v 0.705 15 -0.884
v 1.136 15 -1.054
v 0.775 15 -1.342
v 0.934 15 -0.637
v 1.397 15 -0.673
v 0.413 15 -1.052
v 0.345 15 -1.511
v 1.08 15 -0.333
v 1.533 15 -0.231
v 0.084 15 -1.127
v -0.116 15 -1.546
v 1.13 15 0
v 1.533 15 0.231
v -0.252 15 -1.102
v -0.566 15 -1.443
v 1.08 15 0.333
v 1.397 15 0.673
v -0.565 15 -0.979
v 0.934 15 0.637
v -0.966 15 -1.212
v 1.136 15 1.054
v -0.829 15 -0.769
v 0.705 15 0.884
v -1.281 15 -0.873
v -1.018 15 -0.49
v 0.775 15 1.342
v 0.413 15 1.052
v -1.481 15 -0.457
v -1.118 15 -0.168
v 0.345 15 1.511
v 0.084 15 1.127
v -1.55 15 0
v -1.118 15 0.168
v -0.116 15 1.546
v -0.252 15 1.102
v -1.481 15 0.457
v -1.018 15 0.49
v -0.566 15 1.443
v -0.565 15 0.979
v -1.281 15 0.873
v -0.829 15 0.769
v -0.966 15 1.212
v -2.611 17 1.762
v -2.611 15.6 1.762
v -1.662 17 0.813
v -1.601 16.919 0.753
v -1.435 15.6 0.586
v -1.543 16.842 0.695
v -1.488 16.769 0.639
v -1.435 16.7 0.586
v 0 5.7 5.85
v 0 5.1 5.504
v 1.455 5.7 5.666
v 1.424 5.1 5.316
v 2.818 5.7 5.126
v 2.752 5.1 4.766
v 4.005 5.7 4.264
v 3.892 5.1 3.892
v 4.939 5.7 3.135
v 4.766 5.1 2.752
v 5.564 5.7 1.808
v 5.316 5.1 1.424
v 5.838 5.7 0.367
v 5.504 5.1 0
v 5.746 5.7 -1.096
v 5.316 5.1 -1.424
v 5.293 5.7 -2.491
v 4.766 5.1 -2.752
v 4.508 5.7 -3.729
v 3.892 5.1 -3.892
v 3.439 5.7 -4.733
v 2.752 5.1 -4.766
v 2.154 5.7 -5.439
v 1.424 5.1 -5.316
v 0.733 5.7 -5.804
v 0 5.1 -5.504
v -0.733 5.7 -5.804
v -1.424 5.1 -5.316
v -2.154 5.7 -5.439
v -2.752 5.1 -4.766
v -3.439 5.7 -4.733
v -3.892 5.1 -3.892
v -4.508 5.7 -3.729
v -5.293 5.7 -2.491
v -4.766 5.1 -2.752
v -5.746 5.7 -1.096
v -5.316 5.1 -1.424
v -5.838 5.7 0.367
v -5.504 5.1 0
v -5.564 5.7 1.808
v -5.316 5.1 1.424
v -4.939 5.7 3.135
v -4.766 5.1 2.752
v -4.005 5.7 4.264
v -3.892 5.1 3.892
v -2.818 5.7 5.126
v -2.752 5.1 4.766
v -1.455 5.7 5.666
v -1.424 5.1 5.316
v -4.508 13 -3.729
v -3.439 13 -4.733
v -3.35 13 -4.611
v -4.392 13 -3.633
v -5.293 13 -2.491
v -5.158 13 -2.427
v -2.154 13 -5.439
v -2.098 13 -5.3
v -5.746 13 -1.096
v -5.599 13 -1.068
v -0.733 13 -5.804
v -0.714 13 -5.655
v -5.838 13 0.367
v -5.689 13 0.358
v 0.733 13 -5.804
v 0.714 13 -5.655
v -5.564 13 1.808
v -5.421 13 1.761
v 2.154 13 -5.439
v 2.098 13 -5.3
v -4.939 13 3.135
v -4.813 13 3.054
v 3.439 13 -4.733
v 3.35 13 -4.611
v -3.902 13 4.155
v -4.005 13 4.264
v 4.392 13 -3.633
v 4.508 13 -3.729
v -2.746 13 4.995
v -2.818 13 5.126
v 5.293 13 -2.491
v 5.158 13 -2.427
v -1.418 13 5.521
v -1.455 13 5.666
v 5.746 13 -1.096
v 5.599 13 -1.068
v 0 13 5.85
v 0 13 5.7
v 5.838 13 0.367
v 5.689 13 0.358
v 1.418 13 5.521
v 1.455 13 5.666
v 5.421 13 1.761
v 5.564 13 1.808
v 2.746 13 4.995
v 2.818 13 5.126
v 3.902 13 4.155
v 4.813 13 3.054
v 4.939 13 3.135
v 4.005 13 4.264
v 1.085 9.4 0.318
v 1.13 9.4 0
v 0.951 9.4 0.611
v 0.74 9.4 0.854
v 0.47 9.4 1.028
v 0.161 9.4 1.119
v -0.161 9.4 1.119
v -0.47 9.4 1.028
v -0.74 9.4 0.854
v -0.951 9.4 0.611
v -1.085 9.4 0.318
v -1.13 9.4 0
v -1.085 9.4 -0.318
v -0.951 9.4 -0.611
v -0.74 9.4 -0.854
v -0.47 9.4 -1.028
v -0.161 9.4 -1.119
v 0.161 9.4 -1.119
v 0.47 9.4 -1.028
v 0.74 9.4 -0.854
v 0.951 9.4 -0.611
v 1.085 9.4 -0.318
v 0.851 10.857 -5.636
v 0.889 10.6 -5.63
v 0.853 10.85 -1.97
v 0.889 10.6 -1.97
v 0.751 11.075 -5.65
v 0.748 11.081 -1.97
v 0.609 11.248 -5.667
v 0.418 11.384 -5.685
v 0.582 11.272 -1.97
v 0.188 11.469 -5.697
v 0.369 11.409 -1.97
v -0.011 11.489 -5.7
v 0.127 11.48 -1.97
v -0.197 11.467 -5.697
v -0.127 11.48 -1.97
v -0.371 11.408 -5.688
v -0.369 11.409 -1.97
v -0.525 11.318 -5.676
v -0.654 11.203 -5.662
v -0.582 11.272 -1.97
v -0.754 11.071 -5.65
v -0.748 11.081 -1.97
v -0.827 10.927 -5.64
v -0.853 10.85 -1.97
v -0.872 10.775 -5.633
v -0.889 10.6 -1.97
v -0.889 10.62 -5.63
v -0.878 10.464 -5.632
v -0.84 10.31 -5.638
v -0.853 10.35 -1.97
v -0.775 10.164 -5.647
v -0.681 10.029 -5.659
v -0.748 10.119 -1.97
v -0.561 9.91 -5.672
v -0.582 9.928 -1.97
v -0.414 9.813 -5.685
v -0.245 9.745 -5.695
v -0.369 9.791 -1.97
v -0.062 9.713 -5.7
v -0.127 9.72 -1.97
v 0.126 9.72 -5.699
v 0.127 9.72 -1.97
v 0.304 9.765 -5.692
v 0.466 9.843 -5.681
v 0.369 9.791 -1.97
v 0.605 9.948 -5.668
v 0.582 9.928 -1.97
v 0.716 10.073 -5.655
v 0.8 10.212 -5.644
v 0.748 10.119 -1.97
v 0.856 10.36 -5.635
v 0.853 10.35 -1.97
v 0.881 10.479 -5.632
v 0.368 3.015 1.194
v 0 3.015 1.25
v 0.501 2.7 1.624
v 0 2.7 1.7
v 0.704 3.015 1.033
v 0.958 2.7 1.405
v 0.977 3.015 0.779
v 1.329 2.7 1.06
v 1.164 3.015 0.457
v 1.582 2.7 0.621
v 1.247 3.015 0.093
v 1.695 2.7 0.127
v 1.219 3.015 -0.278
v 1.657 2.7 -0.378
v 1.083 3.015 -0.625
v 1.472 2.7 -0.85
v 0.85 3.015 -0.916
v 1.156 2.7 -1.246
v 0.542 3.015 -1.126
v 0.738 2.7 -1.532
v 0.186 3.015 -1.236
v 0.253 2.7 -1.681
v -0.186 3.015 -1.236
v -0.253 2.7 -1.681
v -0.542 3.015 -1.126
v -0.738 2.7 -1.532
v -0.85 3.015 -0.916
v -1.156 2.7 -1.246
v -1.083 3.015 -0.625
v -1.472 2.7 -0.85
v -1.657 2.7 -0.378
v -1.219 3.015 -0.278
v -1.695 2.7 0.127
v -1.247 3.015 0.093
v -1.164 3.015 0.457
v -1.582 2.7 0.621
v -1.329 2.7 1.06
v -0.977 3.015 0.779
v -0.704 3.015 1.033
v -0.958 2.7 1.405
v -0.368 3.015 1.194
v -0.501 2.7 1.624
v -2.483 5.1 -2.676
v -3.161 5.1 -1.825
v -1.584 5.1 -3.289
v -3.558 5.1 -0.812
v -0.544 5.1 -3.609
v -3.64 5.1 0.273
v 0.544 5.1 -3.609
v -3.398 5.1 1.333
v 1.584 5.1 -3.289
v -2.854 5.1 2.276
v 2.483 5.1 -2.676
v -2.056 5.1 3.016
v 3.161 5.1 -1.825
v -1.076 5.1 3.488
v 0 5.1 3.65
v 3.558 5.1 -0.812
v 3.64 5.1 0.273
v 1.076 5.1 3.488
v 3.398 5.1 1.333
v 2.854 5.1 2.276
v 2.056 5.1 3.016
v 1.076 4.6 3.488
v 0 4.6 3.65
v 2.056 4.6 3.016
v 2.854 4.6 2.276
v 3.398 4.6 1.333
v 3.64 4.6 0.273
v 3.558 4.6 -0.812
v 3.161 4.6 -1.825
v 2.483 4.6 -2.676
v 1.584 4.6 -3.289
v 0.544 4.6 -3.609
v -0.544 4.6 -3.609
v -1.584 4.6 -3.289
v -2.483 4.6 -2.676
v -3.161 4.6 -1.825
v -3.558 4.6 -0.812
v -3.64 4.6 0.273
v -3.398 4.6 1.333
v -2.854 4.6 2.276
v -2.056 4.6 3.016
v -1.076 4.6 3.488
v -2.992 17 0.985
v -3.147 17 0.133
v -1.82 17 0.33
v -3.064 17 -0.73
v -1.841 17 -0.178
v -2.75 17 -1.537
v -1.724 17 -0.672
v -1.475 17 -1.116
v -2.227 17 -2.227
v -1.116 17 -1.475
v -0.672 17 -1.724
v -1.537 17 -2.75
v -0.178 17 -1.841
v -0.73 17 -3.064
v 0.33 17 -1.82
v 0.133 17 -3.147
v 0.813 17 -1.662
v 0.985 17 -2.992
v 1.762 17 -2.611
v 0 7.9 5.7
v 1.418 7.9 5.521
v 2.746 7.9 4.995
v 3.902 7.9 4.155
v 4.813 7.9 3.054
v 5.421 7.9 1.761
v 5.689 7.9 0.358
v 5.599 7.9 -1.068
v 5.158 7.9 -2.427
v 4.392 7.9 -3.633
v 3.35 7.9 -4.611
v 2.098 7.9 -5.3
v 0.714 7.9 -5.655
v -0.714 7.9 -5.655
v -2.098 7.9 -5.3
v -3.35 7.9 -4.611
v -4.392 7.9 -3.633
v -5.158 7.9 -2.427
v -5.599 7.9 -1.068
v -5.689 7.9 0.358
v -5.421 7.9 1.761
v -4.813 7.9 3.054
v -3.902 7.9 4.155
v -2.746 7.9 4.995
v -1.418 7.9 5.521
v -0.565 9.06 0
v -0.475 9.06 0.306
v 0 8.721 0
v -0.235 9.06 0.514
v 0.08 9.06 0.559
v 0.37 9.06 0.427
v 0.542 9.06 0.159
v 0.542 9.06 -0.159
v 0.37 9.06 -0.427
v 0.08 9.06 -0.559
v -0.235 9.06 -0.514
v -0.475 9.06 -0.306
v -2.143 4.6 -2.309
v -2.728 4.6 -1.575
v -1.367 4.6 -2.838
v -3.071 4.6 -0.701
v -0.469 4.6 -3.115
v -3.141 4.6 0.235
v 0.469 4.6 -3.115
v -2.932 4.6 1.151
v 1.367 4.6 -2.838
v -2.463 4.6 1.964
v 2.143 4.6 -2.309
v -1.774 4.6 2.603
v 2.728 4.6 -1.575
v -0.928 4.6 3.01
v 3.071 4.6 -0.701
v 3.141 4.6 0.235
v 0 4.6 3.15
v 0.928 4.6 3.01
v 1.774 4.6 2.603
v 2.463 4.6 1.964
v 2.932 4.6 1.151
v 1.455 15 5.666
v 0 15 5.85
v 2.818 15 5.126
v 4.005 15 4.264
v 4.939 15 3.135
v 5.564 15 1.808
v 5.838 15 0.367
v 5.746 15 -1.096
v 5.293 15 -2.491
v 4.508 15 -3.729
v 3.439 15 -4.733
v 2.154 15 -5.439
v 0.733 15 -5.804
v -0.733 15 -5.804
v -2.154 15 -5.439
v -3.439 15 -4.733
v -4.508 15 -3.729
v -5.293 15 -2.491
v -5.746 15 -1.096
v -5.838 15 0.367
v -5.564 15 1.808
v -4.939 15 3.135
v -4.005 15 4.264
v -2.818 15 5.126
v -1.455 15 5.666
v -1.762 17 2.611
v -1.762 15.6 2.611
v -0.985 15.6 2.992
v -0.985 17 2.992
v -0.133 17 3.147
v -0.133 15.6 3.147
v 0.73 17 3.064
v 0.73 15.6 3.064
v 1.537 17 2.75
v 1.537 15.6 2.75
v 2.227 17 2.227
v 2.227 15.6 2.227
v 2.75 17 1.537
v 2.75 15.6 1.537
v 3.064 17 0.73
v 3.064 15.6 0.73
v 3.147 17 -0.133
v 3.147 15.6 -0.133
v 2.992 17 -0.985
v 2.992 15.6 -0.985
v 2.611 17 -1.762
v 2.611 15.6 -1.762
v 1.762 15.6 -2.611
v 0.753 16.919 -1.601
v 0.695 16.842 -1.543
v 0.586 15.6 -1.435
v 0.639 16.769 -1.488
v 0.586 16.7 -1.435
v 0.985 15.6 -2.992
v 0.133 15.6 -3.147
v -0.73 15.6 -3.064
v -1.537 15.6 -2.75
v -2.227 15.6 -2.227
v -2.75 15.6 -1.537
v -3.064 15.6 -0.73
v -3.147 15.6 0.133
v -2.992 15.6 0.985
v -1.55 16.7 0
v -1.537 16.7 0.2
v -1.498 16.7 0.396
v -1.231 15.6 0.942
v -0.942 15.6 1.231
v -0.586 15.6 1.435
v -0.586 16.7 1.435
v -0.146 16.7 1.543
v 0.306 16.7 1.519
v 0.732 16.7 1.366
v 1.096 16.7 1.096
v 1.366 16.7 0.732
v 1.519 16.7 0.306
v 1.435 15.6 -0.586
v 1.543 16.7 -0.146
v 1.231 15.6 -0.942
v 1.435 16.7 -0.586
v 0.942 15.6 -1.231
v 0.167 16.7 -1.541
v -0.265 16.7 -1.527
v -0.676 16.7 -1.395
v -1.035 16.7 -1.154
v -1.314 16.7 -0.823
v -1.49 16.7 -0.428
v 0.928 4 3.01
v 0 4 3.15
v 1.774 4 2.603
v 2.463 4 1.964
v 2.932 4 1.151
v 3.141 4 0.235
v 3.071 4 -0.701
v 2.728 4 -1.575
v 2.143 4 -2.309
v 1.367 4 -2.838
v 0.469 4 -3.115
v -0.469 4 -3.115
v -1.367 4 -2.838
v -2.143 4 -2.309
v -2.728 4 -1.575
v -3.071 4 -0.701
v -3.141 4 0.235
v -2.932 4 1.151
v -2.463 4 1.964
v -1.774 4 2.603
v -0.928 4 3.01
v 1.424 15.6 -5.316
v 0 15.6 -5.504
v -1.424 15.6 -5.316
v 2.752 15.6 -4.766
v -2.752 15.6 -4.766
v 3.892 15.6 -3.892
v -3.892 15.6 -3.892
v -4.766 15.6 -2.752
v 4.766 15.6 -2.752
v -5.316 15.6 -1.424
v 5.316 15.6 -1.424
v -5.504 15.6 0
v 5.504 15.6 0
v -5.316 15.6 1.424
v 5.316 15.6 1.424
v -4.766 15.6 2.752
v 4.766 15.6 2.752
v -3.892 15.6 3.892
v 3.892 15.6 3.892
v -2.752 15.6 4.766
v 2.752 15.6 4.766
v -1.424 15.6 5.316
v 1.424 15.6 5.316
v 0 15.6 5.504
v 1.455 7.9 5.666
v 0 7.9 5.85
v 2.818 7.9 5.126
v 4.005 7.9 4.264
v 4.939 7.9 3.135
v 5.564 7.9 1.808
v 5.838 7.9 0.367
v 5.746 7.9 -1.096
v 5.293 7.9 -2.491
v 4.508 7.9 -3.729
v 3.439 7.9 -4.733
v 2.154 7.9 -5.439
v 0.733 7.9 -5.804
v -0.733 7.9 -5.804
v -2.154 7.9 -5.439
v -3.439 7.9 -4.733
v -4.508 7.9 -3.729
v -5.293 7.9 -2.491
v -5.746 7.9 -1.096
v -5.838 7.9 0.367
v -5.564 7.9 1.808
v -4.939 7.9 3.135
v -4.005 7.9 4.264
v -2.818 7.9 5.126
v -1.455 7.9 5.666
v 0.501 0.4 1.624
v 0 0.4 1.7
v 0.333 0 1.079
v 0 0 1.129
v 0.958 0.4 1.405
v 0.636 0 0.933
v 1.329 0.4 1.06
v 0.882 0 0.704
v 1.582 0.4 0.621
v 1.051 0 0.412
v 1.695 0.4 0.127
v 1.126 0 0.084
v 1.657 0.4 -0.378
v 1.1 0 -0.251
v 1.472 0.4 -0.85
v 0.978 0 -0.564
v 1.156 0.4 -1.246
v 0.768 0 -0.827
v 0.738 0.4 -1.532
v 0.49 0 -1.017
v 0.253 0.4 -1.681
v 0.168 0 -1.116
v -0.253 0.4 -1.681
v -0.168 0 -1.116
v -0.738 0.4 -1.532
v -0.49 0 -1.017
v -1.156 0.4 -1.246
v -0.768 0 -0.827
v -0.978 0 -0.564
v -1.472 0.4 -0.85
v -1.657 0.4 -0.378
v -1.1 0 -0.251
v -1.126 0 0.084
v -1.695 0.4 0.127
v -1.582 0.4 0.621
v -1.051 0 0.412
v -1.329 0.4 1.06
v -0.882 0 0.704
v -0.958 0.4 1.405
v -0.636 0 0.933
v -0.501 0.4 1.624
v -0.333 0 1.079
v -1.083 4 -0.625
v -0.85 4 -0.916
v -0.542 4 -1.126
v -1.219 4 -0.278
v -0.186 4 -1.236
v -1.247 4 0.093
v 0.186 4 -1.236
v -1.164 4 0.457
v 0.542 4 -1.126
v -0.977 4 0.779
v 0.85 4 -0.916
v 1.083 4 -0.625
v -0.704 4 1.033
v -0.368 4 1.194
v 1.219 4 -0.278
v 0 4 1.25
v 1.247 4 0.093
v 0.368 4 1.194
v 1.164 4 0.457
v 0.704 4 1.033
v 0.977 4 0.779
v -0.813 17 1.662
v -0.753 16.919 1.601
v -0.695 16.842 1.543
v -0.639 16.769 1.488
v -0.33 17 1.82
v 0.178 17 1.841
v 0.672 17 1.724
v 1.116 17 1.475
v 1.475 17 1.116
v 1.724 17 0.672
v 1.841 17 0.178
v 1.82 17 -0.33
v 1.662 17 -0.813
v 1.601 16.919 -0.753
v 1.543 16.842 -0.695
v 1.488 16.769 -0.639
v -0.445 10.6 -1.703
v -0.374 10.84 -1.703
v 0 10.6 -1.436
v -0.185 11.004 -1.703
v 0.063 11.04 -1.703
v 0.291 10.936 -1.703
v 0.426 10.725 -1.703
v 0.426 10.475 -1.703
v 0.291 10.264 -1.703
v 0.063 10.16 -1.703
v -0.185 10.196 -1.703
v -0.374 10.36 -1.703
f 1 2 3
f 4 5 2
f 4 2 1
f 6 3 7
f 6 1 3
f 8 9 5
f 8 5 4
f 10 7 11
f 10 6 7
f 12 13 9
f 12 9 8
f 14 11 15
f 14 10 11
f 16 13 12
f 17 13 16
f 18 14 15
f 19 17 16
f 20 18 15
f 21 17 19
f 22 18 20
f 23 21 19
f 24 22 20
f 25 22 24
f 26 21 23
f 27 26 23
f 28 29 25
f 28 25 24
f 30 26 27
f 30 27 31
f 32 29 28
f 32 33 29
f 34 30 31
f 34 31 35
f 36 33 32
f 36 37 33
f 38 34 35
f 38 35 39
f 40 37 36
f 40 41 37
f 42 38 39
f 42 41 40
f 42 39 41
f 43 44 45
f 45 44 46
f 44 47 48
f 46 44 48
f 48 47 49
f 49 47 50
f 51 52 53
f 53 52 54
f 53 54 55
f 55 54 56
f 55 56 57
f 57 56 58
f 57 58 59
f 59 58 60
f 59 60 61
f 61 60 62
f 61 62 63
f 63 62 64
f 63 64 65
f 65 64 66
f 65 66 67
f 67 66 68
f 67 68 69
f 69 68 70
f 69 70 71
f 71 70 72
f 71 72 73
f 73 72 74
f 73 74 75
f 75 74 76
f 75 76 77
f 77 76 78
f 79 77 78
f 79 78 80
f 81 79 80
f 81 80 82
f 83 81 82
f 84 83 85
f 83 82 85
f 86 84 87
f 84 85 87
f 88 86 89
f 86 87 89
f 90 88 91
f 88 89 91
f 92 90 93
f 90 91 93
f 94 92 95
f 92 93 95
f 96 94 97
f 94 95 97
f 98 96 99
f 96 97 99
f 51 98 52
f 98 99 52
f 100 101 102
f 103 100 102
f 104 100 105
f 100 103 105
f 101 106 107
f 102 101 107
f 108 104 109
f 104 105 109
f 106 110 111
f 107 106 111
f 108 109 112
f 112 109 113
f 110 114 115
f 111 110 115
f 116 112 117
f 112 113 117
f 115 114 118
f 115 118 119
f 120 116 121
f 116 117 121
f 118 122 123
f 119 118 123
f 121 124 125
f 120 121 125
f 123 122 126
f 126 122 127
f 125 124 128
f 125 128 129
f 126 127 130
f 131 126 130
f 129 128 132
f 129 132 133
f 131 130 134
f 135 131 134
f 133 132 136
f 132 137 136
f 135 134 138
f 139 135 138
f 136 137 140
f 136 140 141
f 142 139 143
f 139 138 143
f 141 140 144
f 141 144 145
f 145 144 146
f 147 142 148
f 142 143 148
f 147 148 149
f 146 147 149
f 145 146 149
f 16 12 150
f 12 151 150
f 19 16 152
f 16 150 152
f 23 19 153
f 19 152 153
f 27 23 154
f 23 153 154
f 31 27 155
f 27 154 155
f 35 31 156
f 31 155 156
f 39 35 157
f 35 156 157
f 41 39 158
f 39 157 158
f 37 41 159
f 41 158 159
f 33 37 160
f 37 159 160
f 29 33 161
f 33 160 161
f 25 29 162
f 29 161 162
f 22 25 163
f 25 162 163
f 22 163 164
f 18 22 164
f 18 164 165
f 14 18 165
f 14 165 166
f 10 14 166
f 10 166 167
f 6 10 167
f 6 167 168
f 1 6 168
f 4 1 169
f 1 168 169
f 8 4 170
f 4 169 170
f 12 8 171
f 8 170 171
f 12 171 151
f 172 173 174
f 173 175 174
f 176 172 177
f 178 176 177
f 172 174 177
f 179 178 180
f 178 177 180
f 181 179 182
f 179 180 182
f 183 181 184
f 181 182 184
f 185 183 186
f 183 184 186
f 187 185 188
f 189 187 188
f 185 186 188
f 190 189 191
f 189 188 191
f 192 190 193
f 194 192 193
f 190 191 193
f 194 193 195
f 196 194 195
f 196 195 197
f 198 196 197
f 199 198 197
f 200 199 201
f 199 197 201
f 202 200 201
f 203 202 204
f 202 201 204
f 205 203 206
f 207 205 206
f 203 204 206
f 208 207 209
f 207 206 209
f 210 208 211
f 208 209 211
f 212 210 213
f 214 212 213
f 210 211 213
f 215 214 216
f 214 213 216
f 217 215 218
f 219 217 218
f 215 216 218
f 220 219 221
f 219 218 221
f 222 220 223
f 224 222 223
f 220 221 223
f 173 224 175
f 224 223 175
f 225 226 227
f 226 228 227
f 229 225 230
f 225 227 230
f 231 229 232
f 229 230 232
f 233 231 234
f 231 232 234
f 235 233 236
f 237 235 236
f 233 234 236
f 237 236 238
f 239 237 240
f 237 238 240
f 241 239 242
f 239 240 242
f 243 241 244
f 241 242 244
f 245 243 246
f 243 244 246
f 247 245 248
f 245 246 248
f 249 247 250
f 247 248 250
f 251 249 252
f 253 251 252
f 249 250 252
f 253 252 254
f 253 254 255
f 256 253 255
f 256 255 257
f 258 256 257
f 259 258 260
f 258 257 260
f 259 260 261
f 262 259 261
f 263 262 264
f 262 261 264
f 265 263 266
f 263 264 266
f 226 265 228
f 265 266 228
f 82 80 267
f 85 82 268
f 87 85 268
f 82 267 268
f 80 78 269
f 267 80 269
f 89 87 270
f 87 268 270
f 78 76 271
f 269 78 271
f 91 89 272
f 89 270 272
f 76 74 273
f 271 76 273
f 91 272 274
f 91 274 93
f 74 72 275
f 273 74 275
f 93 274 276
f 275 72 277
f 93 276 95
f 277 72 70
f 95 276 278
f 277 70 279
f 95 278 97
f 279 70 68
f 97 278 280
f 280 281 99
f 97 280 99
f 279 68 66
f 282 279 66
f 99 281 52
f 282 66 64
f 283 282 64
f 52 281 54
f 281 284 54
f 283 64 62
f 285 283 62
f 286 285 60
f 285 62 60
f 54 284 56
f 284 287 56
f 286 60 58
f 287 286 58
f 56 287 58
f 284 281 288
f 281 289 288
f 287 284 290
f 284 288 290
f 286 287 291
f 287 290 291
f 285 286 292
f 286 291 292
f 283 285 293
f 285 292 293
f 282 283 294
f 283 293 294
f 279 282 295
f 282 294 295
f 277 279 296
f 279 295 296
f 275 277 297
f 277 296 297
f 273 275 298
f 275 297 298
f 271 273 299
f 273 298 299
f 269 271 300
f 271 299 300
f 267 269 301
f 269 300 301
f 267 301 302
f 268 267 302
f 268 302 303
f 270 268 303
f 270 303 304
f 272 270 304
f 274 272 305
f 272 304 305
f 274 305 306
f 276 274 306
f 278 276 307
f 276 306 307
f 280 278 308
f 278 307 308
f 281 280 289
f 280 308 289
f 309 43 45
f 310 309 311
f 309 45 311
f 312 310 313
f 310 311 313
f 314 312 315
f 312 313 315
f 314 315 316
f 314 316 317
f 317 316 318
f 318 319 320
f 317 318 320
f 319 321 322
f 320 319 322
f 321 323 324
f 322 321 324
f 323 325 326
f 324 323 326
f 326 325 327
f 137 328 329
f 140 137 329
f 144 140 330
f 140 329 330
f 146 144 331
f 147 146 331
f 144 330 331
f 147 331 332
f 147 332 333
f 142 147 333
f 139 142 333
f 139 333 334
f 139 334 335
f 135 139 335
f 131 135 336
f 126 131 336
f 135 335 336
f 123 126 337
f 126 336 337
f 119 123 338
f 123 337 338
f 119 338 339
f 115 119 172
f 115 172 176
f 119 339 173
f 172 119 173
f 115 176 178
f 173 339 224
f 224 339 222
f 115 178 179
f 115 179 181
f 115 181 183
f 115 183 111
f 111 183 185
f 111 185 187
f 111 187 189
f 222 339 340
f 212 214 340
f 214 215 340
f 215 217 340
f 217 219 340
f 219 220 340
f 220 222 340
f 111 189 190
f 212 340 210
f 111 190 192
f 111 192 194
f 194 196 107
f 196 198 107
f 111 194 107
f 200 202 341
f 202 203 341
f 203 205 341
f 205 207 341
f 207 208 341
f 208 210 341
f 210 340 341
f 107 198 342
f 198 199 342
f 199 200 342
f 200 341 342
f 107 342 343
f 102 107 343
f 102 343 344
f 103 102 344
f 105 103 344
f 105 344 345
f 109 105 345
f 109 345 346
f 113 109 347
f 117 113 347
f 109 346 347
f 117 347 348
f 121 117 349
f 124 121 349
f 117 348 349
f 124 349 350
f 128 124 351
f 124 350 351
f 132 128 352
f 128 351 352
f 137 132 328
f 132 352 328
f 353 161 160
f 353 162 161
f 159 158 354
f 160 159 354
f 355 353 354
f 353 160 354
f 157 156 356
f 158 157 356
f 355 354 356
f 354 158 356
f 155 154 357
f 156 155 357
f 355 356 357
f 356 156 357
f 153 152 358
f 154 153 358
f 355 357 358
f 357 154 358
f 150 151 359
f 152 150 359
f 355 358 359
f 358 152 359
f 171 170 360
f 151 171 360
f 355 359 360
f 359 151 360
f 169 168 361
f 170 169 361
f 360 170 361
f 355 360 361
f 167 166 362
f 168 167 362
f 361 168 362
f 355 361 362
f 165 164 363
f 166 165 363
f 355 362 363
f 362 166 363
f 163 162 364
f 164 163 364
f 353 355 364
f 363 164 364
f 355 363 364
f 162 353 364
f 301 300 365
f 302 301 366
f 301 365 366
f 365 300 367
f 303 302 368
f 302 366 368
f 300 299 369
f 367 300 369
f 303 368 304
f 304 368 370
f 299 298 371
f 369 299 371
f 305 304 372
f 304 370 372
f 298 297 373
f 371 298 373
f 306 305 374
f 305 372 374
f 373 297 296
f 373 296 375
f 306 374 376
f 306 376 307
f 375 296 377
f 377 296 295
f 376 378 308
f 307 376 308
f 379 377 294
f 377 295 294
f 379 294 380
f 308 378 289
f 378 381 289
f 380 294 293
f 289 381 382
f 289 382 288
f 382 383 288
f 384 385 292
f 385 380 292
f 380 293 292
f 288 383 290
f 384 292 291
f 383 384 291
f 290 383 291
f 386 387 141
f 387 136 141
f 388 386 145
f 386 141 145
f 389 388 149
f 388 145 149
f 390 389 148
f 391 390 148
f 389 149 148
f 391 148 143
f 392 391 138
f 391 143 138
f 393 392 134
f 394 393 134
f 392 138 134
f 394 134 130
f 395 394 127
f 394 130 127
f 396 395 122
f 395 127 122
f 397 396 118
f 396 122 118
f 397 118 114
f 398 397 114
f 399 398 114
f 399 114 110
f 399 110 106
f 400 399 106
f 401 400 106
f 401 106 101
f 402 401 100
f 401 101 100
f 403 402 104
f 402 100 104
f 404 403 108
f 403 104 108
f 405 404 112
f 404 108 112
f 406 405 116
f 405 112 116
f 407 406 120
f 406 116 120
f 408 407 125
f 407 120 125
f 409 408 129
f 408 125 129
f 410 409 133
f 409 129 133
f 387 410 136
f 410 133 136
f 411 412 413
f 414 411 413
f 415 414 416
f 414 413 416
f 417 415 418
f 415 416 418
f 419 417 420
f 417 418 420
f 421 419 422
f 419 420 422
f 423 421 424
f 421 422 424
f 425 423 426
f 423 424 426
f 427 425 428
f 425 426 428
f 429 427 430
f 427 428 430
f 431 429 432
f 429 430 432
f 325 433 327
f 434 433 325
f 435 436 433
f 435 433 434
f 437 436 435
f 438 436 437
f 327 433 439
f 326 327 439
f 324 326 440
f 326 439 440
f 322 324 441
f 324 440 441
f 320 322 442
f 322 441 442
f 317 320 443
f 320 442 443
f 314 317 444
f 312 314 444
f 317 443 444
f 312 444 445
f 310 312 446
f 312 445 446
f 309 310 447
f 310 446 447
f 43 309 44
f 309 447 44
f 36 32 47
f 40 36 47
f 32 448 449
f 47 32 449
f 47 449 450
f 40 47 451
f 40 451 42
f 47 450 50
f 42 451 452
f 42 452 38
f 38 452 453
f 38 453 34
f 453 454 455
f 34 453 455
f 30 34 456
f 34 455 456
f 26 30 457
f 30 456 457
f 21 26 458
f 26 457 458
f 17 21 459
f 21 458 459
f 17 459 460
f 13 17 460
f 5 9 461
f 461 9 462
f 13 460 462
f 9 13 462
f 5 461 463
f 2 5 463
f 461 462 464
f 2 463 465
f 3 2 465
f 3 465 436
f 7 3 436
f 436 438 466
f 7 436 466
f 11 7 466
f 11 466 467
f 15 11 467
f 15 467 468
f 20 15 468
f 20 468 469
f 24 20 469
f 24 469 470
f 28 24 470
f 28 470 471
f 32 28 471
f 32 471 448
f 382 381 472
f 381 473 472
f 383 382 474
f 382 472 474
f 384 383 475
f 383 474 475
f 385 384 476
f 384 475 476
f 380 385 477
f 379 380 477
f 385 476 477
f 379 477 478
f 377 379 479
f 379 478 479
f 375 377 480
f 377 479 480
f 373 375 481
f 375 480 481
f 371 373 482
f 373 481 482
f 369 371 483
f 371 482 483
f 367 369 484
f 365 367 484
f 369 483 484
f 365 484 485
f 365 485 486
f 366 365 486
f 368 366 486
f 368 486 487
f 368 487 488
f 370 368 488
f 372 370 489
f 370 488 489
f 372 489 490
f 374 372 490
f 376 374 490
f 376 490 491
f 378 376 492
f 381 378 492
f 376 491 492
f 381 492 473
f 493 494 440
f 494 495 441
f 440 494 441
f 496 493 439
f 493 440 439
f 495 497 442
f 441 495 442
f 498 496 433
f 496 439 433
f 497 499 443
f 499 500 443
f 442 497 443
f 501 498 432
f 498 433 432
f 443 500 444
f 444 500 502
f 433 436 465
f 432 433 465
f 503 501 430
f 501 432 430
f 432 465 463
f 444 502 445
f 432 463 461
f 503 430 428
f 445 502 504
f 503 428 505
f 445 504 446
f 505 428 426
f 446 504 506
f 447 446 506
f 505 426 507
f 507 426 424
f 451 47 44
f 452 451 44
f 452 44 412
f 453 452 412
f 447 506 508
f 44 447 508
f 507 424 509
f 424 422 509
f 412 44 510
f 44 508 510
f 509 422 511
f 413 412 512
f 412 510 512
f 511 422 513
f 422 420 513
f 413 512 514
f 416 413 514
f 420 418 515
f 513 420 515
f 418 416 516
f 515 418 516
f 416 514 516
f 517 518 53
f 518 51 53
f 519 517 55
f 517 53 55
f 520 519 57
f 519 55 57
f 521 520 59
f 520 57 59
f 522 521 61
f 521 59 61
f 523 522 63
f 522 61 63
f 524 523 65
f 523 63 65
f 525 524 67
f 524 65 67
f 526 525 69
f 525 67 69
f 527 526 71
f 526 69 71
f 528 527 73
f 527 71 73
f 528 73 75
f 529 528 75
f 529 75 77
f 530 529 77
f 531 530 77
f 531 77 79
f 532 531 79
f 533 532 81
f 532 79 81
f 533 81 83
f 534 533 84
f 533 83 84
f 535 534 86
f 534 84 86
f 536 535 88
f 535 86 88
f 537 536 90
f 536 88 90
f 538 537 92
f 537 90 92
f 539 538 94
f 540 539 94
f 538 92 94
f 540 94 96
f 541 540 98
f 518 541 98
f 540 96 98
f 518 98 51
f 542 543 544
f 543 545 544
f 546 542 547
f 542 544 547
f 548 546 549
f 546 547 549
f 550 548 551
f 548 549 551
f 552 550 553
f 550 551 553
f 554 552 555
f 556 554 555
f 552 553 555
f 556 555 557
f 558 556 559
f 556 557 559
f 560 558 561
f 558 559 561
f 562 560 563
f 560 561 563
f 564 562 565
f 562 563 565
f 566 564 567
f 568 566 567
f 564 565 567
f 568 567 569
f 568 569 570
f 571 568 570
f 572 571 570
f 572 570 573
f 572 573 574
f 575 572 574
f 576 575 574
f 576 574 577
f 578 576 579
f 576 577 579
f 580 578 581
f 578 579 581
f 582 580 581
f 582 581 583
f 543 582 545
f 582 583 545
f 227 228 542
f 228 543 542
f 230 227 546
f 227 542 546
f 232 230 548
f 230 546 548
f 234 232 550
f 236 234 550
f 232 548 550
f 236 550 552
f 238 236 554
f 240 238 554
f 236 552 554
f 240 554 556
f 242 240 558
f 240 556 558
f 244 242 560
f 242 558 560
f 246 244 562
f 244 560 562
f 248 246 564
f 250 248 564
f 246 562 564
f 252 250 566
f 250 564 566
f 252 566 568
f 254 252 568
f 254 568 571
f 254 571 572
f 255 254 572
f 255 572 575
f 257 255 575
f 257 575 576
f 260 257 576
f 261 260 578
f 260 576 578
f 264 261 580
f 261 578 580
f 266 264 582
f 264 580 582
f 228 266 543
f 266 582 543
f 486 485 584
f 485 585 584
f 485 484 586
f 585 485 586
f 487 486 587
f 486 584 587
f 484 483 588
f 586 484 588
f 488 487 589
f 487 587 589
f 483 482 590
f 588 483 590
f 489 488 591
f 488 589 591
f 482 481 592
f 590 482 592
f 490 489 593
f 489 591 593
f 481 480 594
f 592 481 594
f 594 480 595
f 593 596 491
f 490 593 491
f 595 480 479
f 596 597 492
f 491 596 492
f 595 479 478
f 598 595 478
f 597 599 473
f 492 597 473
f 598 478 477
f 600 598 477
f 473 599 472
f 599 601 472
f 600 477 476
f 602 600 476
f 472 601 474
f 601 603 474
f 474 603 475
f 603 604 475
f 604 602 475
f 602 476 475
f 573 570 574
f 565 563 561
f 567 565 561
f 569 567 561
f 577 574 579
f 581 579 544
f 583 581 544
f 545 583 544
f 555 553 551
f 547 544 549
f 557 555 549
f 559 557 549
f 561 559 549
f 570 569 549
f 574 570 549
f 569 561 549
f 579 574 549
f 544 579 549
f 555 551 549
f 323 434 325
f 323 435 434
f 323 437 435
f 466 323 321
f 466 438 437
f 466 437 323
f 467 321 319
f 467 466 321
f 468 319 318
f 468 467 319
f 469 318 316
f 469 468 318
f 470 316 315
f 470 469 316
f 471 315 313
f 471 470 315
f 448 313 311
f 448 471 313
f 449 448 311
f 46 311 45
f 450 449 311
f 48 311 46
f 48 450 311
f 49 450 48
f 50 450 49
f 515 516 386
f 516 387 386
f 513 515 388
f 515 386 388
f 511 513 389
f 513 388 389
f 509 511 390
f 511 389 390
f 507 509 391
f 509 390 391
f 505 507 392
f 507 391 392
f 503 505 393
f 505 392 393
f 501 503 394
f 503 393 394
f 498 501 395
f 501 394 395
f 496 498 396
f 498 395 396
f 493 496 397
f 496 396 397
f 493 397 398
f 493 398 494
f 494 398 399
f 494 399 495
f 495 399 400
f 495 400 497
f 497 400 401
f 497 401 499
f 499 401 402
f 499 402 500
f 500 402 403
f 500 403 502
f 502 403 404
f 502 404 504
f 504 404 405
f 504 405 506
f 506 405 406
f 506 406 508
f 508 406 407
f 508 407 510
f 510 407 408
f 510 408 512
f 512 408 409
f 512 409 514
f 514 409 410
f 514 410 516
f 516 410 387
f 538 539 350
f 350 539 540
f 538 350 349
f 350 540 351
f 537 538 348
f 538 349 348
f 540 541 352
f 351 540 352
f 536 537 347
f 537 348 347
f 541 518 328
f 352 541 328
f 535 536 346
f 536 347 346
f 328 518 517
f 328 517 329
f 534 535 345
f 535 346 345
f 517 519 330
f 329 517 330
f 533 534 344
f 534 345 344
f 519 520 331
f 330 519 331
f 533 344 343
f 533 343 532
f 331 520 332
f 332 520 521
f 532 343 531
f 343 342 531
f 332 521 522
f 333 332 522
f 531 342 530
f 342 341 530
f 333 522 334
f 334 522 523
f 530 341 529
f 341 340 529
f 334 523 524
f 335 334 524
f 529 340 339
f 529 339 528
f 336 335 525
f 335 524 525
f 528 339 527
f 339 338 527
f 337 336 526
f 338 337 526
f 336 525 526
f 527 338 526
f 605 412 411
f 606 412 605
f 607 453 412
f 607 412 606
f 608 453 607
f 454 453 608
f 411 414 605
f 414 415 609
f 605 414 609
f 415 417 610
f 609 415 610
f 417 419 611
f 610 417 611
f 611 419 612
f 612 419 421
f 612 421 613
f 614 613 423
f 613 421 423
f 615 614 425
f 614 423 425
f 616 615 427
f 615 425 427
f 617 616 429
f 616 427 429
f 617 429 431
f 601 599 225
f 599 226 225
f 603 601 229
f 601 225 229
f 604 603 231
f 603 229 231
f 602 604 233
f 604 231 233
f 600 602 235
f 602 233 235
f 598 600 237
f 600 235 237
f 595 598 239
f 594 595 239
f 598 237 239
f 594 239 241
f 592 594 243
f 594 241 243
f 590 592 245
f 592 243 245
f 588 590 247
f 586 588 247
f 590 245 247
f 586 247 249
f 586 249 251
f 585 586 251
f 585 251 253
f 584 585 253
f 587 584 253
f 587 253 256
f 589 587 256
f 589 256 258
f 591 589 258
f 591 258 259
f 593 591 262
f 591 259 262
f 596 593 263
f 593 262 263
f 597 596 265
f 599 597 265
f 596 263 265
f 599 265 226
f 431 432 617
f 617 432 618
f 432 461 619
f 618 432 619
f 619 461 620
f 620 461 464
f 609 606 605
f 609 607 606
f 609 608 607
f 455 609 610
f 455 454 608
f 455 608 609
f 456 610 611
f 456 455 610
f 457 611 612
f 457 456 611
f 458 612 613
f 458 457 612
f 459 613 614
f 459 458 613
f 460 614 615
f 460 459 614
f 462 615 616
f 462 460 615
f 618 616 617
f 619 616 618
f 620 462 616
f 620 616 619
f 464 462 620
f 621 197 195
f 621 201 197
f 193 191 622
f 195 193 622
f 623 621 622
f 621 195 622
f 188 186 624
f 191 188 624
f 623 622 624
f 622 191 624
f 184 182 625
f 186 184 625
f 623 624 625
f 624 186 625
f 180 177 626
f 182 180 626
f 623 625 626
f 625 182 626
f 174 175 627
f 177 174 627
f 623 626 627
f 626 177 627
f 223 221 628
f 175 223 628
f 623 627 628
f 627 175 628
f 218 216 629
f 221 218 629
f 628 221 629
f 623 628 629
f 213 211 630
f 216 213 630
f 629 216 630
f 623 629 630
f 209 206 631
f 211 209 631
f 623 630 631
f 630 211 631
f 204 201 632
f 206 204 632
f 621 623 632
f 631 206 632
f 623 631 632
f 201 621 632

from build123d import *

# Parameters (mm, degrees)
F_2_56_TAPPED_HOLE1_D           = 1.778
F_2_56_TAPPED_HOLE1_DEPTH       = 3.73
F_2_56_TAPPED_HOLE1_TIP         = 0.53416509
F_4_40_TAPPED_HOLE1_D           = 2.2606
F_4_40_TAPPED_HOLE1_DEPTH       = 7.6
F_4_40_TAPPED_HOLE1_TIP         = 0.679152758
SKETCH_5_R                      = 1.55
CUT_EXTRUDE_1_DEPTH             = 2
CHAMFER_1_SIZE                  = 0.3
CUT_EXTRUDE_2_REACH             = 20.906
SKETCH_6_W                      = 1.2
SKETCH_6_H                      = 1.4
CUT_EXTRUDE_2_DIRECTION_2_REACH = 20.906


with BuildPart() as part:
    # Эскиз1 → Повернуть1 (revolve)
    with BuildSketch(Plane(origin=(0, 0, 0), x_dir=(0, 0, -1), z_dir=(1, 0, 0))):
        Polygon((0, 0), (0, 17), (-3.15, 17), (-3.15, 15.6), (-5.503589838, 15.6), (-5.85, 15), (-5.85, 13), (-5.7, 13), (-5.7, 7.9), (-5.85, 7.9), (-5.85, 5.7), (-5.503589838, 5.1), (-3.65, 5.1), (-3.65, 4.6), (-3.15, 4.6), (-3.15, 4), (-1.25, 4), (-1.25, 3.015093392), (-1.7, 2.7), (-1.7, 0.4), (-1.128740797, 0), align=None)
    revolve(axis=Axis((0, 0, 0), (0, 1, 0)))

    # #2-56 Tapped Hole1
    with Locations(Plane(origin=(0, 10.6, -5.7), x_dir=(-1, 0, 0), z_dir=(0, 0, -1))):
        with Locations((0, 0)):
            Hole(F_2_56_TAPPED_HOLE1_D / 2, depth=F_2_56_TAPPED_HOLE1_DEPTH)
            with Locations((0, 0, -(F_2_56_TAPPED_HOLE1_DEPTH + F_2_56_TAPPED_HOLE1_TIP / 2))):  # 118° drill point
                Cone(0, F_2_56_TAPPED_HOLE1_D / 2, F_2_56_TAPPED_HOLE1_TIP, mode=Mode.SUBTRACT)

    # #4-40 Tapped Hole1
    with Locations(Plane(origin=(0, 17, 0), x_dir=(-1, 0, 0), z_dir=(0, 1, 0))):
        with Locations((0, 0)):
            Hole(F_4_40_TAPPED_HOLE1_D / 2, depth=F_4_40_TAPPED_HOLE1_DEPTH)
            with Locations((0, 0, -(F_4_40_TAPPED_HOLE1_DEPTH + F_4_40_TAPPED_HOLE1_TIP / 2))):  # 118° drill point
                Cone(0, F_4_40_TAPPED_HOLE1_D / 2, F_4_40_TAPPED_HOLE1_TIP, mode=Mode.SUBTRACT)

    # Эскиз5 → Вырез-Вытянуть1 (cut)
    with BuildSketch(Plane(origin=(0, 17, 0), x_dir=(-1, 0, 0), z_dir=(0, 1, 0))):
        Circle(SKETCH_5_R)
    extrude(amount=-CUT_EXTRUDE_1_DEPTH, mode=Mode.SUBTRACT)

    # Фаска1
    chamfer_1_edges = [part.edges().sort_by_distance(p)[0] for p in [
        (1.55, 17, 0),
    ]]
    chamfer(chamfer_1_edges, length=CHAMFER_1_SIZE)

    # Эскиз6 → Вырез-Вытянуть2 (cut, up to next)
    with BuildSketch(Plane(origin=(0, 0, 0), x_dir=(0.7071067811865462, 0, 0.7071067811865488), z_dir=(-0.7071067811865488, 0, 0.7071067811865462)), mode=Mode.PRIVATE) as cut_extrude_2_sk1:
        with Locations((0, 16.3)):
            Rectangle(SKETCH_6_W, SKETCH_6_H)
    cut_extrude_2_tool1 = extrude(cut_extrude_2_sk1.sketch, amount=-CUT_EXTRUDE_2_REACH, mode=Mode.PRIVATE) & part.part
    add(cut_extrude_2_tool1.solids().sort_by_distance((0, 16.3, 0))[0], mode=Mode.SUBTRACT)

    # Эскиз6 → Вырез-Вытянуть2 direction 2 (cut, up to next)
    with BuildSketch(Plane(origin=(0, 0, 0), x_dir=(0.7071067811865462, 0, 0.7071067811865488), z_dir=(-0.7071067811865488, 0, 0.7071067811865462)), mode=Mode.PRIVATE) as cut_extrude_2_direction_2_sk1:
        with Locations((0, 16.3)):
            Rectangle(SKETCH_6_W, SKETCH_6_H)
    cut_extrude_2_direction_2_tool1 = extrude(cut_extrude_2_direction_2_sk1.sketch, amount=CUT_EXTRUDE_2_DIRECTION_2_REACH, mode=Mode.PRIVATE) & part.part
    add(cut_extrude_2_direction_2_tool1.solids().sort_by_distance((0, 16.3, 0))[0], mode=Mode.SUBTRACT)


solid = part.part
